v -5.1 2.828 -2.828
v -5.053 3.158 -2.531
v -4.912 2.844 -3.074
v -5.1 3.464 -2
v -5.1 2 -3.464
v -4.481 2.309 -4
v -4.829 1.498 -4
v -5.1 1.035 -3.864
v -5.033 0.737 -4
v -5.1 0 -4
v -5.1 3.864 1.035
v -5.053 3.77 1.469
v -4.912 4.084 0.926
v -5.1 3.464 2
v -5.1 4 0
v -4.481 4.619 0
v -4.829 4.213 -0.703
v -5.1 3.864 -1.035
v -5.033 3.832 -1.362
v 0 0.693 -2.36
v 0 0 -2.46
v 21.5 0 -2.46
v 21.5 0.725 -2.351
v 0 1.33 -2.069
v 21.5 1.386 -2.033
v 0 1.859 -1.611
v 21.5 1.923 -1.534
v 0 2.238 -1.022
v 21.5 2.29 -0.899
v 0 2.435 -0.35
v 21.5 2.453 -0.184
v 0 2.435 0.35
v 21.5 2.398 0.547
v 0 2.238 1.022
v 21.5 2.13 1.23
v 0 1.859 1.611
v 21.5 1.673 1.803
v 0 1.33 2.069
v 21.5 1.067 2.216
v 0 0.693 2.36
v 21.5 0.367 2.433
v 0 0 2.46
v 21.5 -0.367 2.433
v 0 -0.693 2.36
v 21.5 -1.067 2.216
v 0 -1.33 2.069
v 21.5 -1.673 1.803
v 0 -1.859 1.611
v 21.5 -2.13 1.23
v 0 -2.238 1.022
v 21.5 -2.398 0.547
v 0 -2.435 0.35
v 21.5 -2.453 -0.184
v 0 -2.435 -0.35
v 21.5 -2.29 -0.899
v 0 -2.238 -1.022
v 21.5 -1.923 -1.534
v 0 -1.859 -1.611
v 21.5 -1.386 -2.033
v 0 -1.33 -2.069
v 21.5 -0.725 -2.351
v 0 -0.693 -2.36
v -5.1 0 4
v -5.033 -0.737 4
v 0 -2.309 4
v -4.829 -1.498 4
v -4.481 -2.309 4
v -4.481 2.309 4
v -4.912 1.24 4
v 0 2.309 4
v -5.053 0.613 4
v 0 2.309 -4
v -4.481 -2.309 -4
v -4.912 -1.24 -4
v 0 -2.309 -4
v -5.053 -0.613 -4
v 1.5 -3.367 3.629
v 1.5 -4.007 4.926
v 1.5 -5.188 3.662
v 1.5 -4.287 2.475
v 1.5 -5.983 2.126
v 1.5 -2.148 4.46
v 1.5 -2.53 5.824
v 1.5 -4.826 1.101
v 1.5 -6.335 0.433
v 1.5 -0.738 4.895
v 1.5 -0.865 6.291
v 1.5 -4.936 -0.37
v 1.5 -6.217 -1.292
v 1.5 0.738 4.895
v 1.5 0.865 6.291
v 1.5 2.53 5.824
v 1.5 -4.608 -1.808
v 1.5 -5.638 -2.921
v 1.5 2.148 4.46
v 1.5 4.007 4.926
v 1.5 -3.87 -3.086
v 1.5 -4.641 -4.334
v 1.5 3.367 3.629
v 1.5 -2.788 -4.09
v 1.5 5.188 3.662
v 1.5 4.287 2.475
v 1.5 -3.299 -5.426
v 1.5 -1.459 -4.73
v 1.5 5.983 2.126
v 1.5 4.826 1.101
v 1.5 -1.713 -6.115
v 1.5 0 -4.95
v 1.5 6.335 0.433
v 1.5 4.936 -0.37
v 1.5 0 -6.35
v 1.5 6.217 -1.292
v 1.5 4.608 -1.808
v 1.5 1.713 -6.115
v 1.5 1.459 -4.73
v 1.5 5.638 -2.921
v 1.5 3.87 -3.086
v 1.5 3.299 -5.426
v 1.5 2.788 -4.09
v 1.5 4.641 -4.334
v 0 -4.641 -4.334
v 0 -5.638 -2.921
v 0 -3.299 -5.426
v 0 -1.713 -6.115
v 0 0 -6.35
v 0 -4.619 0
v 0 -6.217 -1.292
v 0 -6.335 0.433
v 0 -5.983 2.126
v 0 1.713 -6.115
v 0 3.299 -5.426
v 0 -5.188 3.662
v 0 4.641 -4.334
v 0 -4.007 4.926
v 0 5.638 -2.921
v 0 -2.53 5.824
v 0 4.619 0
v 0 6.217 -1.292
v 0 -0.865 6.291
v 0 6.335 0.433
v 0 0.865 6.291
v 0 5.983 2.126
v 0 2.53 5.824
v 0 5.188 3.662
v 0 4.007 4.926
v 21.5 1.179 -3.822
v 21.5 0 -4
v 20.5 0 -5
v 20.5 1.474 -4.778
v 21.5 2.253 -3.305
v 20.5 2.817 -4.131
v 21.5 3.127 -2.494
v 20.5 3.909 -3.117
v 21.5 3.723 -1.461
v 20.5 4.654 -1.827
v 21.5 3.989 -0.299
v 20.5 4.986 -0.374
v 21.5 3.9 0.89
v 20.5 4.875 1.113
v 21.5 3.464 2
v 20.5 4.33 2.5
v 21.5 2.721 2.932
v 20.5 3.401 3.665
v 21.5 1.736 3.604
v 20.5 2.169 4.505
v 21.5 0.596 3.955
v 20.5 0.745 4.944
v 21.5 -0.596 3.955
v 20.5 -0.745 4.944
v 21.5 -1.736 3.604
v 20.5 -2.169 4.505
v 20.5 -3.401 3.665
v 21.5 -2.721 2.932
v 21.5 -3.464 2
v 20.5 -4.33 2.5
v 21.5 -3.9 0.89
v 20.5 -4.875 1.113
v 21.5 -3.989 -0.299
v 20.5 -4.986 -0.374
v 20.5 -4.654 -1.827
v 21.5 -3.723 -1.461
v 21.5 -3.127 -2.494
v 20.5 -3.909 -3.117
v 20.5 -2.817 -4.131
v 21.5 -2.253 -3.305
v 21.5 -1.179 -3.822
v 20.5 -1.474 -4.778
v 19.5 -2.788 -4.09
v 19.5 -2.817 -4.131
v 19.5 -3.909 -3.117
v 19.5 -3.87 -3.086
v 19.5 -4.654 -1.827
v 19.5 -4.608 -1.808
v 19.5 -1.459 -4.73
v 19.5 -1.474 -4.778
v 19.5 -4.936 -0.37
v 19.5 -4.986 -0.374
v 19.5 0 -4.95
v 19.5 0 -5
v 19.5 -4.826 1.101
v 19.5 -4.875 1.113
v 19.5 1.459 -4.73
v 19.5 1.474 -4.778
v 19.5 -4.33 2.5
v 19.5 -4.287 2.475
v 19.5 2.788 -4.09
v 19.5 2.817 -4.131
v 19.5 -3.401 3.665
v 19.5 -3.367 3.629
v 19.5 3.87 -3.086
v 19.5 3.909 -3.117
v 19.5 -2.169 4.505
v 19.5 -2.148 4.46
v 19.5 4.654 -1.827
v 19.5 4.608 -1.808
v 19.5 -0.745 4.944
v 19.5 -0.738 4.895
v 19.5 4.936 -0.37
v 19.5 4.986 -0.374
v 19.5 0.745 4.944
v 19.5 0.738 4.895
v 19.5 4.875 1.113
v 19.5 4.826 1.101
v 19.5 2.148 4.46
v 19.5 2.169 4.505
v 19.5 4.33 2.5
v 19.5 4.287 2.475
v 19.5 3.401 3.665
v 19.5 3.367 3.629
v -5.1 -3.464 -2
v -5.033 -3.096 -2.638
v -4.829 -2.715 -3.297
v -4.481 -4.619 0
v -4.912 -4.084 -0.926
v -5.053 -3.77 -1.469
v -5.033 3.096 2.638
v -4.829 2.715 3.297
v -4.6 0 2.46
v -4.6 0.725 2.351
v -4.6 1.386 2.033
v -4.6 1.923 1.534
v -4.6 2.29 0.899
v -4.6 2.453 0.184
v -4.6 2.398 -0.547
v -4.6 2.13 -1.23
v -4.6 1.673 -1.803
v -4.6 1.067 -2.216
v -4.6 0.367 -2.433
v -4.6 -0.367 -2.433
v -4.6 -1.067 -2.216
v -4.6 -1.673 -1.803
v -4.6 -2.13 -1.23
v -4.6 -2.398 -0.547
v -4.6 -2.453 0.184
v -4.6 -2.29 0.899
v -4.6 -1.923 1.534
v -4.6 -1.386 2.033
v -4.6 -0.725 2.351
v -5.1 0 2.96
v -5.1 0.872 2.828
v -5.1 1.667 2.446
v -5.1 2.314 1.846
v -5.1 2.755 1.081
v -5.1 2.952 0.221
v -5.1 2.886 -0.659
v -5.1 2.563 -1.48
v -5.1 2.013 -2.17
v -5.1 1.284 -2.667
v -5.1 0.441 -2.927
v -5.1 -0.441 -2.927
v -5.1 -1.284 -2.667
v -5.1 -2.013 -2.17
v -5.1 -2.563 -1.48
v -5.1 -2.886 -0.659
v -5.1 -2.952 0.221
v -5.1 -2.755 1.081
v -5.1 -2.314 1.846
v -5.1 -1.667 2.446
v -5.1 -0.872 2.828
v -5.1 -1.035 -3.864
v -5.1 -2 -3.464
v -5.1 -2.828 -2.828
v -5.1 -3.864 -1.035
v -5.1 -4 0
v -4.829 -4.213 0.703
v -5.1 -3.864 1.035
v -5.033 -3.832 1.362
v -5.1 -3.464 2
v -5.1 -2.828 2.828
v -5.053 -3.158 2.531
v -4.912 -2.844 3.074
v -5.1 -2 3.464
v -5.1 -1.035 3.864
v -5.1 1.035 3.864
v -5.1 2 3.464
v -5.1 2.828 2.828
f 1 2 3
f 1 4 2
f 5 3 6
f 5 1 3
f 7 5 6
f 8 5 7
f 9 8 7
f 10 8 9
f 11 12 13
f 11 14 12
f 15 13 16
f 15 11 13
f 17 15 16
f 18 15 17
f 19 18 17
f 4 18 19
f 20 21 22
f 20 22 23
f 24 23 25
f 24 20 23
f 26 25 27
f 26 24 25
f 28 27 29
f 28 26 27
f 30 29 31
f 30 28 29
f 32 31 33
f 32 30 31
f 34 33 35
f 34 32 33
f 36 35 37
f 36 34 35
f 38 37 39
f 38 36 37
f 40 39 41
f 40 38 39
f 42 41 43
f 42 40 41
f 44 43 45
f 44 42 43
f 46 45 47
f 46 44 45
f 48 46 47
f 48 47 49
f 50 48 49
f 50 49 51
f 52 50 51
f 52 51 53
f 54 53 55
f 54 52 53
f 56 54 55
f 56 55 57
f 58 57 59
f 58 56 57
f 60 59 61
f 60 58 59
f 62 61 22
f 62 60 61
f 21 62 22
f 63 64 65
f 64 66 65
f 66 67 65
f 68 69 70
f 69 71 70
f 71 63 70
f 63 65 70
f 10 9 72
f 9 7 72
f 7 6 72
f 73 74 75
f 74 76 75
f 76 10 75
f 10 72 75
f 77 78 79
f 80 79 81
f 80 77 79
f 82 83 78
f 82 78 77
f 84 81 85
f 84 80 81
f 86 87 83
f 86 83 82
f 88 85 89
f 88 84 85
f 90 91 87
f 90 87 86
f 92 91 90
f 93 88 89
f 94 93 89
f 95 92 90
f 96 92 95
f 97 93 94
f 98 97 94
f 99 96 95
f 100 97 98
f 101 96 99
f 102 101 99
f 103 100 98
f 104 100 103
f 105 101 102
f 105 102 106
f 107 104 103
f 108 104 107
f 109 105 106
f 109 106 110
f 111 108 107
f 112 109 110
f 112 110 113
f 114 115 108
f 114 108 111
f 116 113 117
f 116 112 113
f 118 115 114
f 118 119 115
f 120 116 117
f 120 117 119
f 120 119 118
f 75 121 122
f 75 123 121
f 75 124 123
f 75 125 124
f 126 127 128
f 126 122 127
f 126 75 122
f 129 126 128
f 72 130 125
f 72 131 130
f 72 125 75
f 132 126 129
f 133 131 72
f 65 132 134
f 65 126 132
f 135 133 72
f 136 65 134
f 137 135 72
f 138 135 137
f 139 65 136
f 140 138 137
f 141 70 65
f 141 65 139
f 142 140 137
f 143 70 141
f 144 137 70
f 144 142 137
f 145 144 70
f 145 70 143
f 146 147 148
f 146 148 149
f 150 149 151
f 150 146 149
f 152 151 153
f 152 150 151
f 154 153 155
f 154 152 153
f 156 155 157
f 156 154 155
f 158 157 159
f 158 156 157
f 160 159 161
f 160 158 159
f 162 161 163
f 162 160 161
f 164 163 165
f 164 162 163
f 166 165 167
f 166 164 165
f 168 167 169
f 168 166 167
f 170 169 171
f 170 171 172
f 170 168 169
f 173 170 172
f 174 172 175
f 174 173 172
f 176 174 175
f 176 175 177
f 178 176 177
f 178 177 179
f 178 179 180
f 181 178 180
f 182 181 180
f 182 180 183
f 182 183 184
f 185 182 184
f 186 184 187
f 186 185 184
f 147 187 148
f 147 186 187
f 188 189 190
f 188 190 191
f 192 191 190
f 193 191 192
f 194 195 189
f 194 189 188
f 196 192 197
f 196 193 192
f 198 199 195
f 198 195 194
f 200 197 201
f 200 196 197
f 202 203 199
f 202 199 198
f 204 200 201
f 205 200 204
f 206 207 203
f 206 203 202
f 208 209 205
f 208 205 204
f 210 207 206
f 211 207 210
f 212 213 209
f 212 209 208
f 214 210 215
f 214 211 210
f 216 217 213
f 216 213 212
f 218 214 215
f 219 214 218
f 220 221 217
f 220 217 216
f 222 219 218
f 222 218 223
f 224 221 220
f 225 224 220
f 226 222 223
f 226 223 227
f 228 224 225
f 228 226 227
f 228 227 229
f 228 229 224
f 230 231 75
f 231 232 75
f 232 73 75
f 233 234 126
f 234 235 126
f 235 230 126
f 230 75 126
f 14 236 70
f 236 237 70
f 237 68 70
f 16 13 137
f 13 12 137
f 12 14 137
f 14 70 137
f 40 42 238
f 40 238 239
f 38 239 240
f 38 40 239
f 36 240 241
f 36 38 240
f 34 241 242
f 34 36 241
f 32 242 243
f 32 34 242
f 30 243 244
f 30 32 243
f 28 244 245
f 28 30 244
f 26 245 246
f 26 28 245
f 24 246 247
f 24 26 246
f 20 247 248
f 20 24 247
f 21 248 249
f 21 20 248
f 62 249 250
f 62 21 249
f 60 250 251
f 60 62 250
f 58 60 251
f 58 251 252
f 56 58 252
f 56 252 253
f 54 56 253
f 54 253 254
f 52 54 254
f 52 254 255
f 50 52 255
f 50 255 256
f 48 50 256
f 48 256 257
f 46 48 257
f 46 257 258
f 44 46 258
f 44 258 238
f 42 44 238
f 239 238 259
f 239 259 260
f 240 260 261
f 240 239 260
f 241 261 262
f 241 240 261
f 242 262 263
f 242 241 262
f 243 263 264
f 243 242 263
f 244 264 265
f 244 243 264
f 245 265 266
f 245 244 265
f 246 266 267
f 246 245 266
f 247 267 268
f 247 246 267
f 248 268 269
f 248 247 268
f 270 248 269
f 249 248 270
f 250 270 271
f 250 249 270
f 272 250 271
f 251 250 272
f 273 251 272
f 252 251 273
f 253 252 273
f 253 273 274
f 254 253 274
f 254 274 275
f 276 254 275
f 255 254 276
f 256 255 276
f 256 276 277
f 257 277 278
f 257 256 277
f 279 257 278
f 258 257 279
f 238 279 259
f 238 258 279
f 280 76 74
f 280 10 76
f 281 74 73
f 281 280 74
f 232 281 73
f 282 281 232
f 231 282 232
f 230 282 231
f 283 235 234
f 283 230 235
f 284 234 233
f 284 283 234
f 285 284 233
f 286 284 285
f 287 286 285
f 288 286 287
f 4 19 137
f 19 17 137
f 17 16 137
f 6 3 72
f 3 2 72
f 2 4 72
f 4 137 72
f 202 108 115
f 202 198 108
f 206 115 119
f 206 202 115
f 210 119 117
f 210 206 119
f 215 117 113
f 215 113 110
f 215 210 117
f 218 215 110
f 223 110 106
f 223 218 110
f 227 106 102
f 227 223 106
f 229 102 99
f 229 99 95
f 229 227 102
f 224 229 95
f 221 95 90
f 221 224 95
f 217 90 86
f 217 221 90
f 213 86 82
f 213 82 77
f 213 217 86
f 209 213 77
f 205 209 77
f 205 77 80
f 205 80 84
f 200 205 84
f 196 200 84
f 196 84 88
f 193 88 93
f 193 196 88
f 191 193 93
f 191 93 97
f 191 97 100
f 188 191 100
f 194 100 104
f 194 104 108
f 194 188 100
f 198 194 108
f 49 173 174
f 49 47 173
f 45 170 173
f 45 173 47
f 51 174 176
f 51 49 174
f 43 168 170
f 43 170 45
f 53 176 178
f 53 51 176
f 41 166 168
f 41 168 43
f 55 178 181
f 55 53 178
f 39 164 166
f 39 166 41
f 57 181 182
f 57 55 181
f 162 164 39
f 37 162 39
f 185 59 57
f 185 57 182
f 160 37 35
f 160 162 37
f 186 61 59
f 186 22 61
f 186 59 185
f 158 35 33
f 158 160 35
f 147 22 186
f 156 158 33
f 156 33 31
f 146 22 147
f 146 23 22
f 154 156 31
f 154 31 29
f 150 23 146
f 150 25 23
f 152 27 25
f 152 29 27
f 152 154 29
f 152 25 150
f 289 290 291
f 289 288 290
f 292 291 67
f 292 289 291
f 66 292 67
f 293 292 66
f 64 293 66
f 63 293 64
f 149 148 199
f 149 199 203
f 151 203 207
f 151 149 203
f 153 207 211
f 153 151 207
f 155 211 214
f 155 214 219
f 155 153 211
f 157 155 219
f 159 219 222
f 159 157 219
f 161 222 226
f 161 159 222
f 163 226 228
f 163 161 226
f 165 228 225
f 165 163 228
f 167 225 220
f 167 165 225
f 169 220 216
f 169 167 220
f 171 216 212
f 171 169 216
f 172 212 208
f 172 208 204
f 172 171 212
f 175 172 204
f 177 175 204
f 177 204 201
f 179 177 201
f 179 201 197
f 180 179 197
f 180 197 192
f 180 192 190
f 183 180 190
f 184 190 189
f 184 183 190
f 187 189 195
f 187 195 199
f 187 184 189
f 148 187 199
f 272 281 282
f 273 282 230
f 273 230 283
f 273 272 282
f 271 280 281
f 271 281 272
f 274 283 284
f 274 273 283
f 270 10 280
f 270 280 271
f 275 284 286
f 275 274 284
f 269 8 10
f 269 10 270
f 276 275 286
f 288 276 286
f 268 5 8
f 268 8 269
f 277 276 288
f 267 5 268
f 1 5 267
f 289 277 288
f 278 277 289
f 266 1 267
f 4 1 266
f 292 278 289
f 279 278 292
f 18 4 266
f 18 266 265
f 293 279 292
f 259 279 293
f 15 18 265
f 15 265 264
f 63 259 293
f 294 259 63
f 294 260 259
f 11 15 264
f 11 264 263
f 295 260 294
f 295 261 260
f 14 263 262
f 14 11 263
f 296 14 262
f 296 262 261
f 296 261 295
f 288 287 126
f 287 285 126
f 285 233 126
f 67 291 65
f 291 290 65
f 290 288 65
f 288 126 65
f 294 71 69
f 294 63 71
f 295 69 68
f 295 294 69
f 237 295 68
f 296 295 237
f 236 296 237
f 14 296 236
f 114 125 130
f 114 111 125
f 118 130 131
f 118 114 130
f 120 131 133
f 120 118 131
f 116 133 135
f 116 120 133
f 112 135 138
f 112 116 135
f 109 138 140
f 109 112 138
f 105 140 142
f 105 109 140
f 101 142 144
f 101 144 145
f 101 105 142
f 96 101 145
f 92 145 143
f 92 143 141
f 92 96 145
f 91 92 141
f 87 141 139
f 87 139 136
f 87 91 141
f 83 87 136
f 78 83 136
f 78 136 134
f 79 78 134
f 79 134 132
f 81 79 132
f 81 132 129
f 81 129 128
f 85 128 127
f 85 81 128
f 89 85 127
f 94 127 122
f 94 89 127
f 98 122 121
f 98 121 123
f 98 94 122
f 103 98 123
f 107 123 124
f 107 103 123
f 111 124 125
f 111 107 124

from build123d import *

# Parameters (mm, degrees)
SFAZOWANIE1_SIZE            = 1
SZKIC2_R                    = 2.46
DODANIE_WYCI_GNI_CIE1_DEPTH = 5.1
SFAZOWANIE2_SIZE            = 0.5


with BuildPart() as part:
    # Szkic1 → Obrót1 (revolve)
    with BuildSketch(Plane(origin=(0, 0, 0), x_dir=(1, 0, 0), z_dir=(0, 1, 0))):
        Polygon((0, 2.46), (0, 6.35), (1.5, 6.35), (1.5, 4.95), (19.5, 4.95), (19.5, 5), (21.5, 5), (21.5, 2.46), align=None)
    revolve(axis=Axis((0, 0, 0), (1, 0, 0)))

    # Sfazowanie1
    sfazowanie1_edges = [part.edges().sort_by_distance(p)[0] for p in [
        (21.5, 0, 5),
    ]]
    chamfer(sfazowanie1_edges, length=SFAZOWANIE1_SIZE)

    # Szkic2 → Dodanie-wyciągnięcie1 (add)
    with BuildSketch(Plane.ZY):
        Polygon((4, -2.309401077), (4, 2.309401077), (0, 4.618802154), (-4, 2.309401077), (-4, -2.309401077), (0, -4.618802154), align=None)
        Circle(SZKIC2_R, mode=Mode.SUBTRACT)
    extrude(amount=DODANIE_WYCI_GNI_CIE1_DEPTH)

    # Szkic3 → Wycięcie-obrót1 (revolve, cut)
    with BuildSketch(Plane.XY):
        Polygon((-5.1, 4.618802154), (-4.481197846, 4.618802154), (-5.1, 4), align=None)
    revolve(axis=Axis((-4.836570642, 0, 0), (-1, 0, 0)), mode=Mode.SUBTRACT)

    # Sfazowanie2
    sfazowanie2_edges = [part.edges().sort_by_distance(p)[0] for p in [
        (-5.1, 0, -2.46),
    ]]
    chamfer(sfazowanie2_edges, length=SFAZOWANIE2_SIZE)


solid = part.part
